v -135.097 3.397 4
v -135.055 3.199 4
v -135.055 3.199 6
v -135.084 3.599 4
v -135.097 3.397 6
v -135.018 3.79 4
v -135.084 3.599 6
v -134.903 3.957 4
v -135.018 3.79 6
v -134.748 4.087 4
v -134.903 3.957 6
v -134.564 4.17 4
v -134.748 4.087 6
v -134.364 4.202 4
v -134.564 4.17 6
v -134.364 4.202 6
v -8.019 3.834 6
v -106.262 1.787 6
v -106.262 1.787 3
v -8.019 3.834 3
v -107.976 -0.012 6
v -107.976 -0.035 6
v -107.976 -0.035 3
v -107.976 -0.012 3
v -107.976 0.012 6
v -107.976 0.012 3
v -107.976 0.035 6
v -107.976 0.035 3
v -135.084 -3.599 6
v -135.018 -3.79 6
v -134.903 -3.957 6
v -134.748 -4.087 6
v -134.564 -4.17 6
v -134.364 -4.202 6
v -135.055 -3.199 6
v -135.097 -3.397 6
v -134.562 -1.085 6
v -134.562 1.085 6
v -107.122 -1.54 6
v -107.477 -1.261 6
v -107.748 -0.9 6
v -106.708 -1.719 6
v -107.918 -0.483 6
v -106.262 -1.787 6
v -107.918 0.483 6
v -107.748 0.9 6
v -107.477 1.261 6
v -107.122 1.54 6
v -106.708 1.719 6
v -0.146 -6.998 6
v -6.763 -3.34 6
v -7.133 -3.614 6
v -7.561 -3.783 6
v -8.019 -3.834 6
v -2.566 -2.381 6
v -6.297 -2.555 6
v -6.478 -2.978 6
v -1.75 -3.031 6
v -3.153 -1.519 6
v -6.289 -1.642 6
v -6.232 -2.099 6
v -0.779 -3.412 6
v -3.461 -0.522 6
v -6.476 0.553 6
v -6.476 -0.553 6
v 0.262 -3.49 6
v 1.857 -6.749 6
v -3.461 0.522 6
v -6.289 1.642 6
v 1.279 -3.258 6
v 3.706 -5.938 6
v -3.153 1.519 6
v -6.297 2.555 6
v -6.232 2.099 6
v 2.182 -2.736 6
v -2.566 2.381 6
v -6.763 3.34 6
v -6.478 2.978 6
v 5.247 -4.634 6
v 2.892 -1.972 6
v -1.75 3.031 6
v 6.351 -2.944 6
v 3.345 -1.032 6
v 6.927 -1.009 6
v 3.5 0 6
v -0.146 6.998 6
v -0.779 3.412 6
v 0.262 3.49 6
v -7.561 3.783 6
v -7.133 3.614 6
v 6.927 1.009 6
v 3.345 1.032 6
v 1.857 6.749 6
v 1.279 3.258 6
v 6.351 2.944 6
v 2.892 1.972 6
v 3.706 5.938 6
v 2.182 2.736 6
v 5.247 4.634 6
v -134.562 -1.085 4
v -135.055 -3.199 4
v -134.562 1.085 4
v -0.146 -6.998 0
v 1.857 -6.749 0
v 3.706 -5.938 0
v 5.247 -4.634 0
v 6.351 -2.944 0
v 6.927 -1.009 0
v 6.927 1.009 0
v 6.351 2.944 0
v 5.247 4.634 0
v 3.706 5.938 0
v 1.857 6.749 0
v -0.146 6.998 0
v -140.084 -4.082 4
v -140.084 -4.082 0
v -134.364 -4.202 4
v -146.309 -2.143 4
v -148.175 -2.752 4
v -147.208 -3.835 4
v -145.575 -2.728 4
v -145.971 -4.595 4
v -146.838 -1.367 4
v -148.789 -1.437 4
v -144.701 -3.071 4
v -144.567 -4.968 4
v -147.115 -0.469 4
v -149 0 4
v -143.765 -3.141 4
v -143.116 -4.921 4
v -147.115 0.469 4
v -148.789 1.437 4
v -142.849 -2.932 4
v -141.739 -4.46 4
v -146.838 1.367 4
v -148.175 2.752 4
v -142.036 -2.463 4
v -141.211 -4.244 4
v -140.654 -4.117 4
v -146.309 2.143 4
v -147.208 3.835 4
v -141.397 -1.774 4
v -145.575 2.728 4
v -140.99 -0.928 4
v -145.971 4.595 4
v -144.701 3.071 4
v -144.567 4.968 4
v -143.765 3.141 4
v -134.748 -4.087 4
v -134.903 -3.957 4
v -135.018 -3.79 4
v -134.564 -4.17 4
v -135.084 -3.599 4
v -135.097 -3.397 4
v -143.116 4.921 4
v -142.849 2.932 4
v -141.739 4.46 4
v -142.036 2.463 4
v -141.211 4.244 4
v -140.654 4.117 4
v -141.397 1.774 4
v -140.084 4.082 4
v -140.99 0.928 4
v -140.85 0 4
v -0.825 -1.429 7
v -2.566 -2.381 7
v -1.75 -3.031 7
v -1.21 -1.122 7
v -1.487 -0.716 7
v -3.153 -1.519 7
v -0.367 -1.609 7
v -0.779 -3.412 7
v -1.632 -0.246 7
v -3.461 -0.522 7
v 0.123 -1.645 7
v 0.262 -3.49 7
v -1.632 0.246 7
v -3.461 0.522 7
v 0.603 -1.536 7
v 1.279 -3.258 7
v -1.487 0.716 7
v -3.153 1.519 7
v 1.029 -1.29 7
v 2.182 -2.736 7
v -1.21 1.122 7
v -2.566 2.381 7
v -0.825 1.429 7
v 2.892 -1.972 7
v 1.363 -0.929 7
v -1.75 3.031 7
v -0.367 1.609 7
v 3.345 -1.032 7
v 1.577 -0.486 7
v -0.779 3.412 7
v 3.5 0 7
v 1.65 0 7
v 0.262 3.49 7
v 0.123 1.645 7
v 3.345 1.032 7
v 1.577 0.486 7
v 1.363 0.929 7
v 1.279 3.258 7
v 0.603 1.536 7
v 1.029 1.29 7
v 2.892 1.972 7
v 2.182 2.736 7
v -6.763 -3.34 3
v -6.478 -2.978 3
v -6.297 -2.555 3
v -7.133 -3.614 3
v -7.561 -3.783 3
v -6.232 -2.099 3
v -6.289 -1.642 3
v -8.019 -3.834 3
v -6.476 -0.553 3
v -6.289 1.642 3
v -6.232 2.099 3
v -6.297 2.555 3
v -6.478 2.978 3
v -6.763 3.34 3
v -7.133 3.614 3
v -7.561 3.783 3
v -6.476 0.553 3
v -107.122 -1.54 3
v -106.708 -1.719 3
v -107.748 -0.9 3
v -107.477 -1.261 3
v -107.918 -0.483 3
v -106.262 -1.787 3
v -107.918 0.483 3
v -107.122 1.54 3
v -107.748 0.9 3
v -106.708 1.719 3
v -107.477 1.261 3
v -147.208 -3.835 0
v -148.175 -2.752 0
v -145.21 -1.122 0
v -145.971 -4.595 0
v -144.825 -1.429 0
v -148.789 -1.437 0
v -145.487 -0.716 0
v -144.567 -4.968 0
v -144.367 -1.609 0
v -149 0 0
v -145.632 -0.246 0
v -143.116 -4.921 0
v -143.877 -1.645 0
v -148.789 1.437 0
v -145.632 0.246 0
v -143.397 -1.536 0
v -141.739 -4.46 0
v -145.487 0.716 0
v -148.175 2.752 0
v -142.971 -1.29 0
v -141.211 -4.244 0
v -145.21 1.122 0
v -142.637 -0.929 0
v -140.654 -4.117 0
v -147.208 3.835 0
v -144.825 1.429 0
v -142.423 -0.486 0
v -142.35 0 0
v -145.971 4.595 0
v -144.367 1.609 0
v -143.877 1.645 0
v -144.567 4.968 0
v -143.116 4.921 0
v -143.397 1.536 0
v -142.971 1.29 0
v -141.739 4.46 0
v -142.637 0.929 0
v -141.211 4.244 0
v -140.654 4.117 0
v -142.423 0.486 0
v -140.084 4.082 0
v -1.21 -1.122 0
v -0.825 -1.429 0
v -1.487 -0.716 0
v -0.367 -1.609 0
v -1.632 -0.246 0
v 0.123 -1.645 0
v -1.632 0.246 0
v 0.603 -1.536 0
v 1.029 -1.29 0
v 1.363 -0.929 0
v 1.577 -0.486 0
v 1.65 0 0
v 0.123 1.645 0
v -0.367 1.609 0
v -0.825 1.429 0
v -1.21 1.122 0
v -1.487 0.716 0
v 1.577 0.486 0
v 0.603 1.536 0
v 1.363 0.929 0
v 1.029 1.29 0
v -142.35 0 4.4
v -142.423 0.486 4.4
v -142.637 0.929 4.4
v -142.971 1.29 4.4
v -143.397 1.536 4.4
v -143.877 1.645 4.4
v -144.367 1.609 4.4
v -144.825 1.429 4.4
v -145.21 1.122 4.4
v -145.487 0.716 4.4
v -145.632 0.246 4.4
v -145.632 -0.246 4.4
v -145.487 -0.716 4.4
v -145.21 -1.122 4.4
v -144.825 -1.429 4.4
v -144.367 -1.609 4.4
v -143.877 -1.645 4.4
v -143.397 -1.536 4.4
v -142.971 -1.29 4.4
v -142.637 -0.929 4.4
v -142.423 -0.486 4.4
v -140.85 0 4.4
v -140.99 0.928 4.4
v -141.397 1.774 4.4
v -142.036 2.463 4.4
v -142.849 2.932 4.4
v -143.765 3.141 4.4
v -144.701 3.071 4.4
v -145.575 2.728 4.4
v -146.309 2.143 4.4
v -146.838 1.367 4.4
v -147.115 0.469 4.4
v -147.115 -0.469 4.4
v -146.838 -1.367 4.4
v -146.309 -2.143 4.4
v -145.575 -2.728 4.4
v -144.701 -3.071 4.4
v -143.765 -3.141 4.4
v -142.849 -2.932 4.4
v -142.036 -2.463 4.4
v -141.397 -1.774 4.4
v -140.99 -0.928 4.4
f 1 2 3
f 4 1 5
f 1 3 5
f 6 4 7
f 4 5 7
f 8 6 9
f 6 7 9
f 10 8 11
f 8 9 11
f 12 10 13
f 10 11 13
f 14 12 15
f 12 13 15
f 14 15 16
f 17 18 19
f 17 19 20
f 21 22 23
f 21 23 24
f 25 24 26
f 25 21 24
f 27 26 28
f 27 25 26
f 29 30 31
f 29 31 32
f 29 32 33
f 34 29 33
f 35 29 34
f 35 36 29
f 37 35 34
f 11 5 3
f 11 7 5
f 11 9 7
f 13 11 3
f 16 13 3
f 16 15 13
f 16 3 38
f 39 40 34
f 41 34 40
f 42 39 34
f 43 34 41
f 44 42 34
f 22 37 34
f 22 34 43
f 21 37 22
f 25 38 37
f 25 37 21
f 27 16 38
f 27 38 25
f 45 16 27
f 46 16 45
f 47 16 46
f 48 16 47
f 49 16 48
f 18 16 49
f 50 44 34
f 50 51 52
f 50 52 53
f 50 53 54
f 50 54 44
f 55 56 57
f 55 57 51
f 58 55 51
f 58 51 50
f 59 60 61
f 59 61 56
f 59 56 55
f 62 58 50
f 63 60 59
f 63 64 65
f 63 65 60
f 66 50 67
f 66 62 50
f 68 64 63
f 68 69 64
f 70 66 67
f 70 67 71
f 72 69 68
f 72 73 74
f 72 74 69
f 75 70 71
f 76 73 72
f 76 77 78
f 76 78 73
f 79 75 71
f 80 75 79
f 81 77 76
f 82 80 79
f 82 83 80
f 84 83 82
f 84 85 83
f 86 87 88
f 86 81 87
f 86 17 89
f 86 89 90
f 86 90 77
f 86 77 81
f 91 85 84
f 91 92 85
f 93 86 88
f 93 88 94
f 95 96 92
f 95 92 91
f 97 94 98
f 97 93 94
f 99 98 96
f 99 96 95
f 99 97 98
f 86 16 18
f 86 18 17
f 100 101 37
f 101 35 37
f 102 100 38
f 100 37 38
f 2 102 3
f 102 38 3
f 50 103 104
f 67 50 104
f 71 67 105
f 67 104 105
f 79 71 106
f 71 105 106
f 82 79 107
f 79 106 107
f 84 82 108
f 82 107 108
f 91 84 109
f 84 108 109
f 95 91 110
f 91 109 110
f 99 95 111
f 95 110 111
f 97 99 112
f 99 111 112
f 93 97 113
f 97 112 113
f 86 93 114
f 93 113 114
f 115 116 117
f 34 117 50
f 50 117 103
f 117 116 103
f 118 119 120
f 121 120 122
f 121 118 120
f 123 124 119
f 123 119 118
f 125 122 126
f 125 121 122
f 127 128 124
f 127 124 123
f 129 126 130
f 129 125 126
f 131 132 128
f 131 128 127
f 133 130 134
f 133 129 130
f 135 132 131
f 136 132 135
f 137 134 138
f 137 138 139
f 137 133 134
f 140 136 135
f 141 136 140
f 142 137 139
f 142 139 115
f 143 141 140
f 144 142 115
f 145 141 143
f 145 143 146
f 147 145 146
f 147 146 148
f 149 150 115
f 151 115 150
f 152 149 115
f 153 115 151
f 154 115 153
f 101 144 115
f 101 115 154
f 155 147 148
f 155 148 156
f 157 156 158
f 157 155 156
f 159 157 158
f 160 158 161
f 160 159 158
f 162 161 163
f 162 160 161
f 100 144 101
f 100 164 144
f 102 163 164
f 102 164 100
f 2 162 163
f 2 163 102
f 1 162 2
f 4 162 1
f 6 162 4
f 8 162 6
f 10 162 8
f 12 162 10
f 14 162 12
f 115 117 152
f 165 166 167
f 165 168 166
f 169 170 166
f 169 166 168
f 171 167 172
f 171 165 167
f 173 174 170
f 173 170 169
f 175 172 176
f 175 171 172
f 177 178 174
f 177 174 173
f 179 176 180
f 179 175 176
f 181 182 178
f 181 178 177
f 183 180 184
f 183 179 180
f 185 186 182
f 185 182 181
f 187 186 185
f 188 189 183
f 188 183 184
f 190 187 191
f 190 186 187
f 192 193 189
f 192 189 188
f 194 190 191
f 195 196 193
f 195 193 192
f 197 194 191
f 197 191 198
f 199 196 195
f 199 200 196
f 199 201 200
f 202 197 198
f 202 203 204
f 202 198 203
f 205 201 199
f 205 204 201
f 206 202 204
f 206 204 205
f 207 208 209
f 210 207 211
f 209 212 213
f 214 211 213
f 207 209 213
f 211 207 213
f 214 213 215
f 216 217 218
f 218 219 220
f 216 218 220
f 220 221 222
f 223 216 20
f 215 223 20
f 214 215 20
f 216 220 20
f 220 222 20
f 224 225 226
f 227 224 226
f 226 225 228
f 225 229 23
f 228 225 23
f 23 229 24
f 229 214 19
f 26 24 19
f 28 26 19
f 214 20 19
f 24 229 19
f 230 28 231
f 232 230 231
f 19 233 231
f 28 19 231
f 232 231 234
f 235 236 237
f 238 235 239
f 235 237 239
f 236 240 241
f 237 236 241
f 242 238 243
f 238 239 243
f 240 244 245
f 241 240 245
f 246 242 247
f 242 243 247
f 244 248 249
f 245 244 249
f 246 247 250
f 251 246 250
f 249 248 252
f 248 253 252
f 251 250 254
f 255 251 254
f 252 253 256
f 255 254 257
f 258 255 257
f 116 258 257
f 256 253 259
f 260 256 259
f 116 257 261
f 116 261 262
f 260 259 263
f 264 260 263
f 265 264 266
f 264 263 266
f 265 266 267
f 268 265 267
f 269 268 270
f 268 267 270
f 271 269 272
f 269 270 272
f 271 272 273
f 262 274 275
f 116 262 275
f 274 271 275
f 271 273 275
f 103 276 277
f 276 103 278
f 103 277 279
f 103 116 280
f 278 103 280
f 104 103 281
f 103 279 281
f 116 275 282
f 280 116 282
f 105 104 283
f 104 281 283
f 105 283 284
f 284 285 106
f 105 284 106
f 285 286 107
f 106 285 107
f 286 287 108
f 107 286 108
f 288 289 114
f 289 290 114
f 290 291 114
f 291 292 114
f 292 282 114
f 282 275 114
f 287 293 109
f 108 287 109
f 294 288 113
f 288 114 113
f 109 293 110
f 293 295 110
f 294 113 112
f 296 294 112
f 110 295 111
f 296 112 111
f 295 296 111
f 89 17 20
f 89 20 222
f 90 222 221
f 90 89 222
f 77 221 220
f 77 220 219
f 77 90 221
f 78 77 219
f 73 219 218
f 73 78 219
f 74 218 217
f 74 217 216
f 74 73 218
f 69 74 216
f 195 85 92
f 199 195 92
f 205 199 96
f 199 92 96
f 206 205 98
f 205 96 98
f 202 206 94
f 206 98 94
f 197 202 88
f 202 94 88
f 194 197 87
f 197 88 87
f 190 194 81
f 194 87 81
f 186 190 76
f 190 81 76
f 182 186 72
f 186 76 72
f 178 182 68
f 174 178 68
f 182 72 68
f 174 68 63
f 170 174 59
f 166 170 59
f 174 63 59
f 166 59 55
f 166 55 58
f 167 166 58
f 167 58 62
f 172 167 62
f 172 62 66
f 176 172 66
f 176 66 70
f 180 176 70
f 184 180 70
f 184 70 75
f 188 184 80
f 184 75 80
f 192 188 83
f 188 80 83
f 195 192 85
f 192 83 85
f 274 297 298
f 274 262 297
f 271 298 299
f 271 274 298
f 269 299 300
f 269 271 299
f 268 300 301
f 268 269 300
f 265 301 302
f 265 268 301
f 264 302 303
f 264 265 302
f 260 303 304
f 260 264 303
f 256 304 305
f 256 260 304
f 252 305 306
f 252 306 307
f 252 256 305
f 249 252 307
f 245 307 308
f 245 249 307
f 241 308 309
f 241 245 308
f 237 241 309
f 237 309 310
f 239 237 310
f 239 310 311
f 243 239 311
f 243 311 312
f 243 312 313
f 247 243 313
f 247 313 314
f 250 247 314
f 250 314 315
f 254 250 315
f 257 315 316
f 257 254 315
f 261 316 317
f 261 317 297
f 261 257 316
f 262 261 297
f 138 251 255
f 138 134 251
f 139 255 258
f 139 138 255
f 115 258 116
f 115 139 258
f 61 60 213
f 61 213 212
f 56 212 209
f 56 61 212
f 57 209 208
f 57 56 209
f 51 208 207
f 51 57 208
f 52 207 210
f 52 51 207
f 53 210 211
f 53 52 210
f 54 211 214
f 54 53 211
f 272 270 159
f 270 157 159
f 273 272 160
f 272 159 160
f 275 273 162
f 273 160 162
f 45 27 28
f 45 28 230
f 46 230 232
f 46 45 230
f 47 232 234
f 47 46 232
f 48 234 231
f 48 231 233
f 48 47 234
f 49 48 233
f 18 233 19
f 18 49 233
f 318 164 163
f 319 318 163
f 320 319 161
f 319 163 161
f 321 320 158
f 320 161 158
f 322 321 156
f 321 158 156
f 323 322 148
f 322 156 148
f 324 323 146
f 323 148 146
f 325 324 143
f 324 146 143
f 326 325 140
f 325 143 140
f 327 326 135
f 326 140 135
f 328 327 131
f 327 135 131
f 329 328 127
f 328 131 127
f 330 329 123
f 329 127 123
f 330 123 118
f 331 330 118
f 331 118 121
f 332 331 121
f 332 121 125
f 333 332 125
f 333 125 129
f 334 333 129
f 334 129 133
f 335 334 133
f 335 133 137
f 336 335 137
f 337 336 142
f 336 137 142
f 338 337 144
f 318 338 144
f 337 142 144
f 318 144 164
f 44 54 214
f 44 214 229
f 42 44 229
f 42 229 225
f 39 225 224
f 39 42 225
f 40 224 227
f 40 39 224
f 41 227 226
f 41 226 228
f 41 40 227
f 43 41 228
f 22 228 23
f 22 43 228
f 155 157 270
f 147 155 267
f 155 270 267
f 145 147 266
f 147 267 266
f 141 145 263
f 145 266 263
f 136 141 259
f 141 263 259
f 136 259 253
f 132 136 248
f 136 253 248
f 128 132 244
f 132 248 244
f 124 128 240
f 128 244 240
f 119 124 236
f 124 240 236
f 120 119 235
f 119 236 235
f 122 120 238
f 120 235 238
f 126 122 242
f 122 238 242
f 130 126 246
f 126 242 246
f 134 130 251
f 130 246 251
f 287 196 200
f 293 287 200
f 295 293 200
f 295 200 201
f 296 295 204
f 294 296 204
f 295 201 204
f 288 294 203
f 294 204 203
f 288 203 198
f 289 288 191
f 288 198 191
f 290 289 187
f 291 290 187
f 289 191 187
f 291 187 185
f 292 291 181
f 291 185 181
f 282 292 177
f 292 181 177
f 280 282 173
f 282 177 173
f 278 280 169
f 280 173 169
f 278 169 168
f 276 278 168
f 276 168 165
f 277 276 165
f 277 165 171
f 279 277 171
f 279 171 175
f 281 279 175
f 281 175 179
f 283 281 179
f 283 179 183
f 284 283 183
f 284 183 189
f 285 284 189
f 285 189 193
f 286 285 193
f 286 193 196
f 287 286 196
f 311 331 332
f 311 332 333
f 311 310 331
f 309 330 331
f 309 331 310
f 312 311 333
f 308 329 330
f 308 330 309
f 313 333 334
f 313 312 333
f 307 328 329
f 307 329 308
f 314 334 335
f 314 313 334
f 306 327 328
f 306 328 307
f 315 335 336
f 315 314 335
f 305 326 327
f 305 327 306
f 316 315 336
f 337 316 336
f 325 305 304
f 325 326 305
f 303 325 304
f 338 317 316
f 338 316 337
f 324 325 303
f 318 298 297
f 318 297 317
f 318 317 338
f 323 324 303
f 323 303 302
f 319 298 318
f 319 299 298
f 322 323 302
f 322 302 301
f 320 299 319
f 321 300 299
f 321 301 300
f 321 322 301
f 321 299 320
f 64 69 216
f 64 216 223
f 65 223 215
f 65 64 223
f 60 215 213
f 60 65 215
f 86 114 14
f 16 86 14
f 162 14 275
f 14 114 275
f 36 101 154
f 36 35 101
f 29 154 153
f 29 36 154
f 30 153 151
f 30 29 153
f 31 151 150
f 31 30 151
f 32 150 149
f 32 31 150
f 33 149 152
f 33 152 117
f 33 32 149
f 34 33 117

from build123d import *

# Parameters (mm, degrees)
SKETCH1_R           = 1.65
BOSS_EXTRUDE1_DEPTH = 6
SKETCH2_R           = 3.5
BOSS_EXTRUDE2_DEPTH = 1
SKETCH4_R           = 1.65
CUT_EXTRUDE1_DEPTH  = 12
SKETCH7_R           = 9.5
CUT_EXTRUDE3_DEPTH  = 2
FILLET2_R           = 0.75
FILLET3_R           = 3.5
SKETCH8_R           = 3.15
SKETCH8_R_2         = 1.65
BOSS_EXTRUDE5_DEPTH = 0.4
CUT_EXTRUDE4_DEPTH  = 3


with BuildPart() as part:
    # Sketch1 → Boss-Extrude1 (new body)
    with BuildSketch(Plane.XY):
        with BuildLine():
            ThreePointArc((-0.145833333, -6.998480738), (7, 0), (-0.145833333, 6.998480738))
            Line((-0.145833333, 6.998480738), (-141.083984446, 4.06163185))
            ThreePointArc((-141.083984446, 4.06163185), (-149, 0), (-141.083984446, -4.06163185))
            Line((-141.083984446, -4.06163185), (-0.145833333, -6.998480738))
        make_face()
        with Locations((-144, 0)):
            Circle(SKETCH1_R, mode=Mode.SUBTRACT)
    extrude(amount=BOSS_EXTRUDE1_DEPTH)

    # Sketch2 → Boss-Extrude2 (add)
    with BuildSketch(Plane.XY.offset(6)):
        Circle(SKETCH2_R)
    extrude(amount=BOSS_EXTRUDE2_DEPTH)

    # Sketch4 → Cut-Extrude1 (cut)
    with BuildSketch(Plane.XY.offset(7)):
        Circle(SKETCH4_R)
    extrude(amount=-CUT_EXTRUDE1_DEPTH, mode=Mode.SUBTRACT)

    # Sketch7 → Cut-Extrude3 (cut)
    with BuildSketch(Plane.XY.offset(6)):
        with Locations((-144, 0)):
            Circle(SKETCH7_R)
    extrude(amount=-CUT_EXTRUDE3_DEPTH, mode=Mode.SUBTRACT)

    # Fillet2
    fillet2_edges = [part.edges().sort_by_distance(p)[0] for p in [
        (-135.468359541, 4.178649433, 5),
        (-135.468359541, -4.178649433, 5),
    ]]
    fillet(fillet2_edges, radius=FILLET2_R)

    # Fillet3
    fillet3_edges = [part.edges().sort_by_distance(p)[0] for p in [
        (-141.083984446, -4.06163185, 2),
        (-141.083984446, 4.06163185, 2),
    ]]
    fillet(fillet3_edges, radius=FILLET3_R)

    # Sketch8 → Boss-Extrude5 (add)
    with BuildSketch(Plane.XY.offset(4)):
        with Locations((-144, 0)):
            Circle(SKETCH8_R)
        with Locations((-144, 0)):
            Circle(SKETCH8_R_2, mode=Mode.SUBTRACT)
    extrude(amount=BOSS_EXTRUDE5_DEPTH)

    # Sketch9 → Cut-Extrude4 (cut)
    with BuildSketch(Plane.XY.offset(6)):
        with BuildLine():
            Line((-8.018864585, -3.833772393), (-106.262176435, -1.786592415))
            ThreePointArc((-106.262176435, -1.786592415), (-107.476577581, -1.260839283), (-107.975717263, -0.035259389))
            ThreePointArc((-107.975717263, -0.035259389), (-107.975700008, 0), (-107.975717263, 0.035259389))
            ThreePointArc((-107.975717263, 0.035259389), (-107.476577581, 1.260839283), (-106.262176435, 1.786592415))
            Line((-106.262176435, 1.786592415), (-8.018864585, 3.833772393))
            ThreePointArc((-8.018864585, 3.833772393), (-6.60867738, 3.168296566), (-6.289168562, 1.642059316))
            ThreePointArc((-6.289168562, 1.642059316), (-6.5, 0), (-6.289168562, -1.642059316))
            ThreePointArc((-6.289168562, -1.642059316), (-6.60867738, -3.168296566), (-8.018864585, -3.833772393))
        make_face()
    extrude(amount=-CUT_EXTRUDE4_DEPTH, mode=Mode.SUBTRACT)


solid = part.part
